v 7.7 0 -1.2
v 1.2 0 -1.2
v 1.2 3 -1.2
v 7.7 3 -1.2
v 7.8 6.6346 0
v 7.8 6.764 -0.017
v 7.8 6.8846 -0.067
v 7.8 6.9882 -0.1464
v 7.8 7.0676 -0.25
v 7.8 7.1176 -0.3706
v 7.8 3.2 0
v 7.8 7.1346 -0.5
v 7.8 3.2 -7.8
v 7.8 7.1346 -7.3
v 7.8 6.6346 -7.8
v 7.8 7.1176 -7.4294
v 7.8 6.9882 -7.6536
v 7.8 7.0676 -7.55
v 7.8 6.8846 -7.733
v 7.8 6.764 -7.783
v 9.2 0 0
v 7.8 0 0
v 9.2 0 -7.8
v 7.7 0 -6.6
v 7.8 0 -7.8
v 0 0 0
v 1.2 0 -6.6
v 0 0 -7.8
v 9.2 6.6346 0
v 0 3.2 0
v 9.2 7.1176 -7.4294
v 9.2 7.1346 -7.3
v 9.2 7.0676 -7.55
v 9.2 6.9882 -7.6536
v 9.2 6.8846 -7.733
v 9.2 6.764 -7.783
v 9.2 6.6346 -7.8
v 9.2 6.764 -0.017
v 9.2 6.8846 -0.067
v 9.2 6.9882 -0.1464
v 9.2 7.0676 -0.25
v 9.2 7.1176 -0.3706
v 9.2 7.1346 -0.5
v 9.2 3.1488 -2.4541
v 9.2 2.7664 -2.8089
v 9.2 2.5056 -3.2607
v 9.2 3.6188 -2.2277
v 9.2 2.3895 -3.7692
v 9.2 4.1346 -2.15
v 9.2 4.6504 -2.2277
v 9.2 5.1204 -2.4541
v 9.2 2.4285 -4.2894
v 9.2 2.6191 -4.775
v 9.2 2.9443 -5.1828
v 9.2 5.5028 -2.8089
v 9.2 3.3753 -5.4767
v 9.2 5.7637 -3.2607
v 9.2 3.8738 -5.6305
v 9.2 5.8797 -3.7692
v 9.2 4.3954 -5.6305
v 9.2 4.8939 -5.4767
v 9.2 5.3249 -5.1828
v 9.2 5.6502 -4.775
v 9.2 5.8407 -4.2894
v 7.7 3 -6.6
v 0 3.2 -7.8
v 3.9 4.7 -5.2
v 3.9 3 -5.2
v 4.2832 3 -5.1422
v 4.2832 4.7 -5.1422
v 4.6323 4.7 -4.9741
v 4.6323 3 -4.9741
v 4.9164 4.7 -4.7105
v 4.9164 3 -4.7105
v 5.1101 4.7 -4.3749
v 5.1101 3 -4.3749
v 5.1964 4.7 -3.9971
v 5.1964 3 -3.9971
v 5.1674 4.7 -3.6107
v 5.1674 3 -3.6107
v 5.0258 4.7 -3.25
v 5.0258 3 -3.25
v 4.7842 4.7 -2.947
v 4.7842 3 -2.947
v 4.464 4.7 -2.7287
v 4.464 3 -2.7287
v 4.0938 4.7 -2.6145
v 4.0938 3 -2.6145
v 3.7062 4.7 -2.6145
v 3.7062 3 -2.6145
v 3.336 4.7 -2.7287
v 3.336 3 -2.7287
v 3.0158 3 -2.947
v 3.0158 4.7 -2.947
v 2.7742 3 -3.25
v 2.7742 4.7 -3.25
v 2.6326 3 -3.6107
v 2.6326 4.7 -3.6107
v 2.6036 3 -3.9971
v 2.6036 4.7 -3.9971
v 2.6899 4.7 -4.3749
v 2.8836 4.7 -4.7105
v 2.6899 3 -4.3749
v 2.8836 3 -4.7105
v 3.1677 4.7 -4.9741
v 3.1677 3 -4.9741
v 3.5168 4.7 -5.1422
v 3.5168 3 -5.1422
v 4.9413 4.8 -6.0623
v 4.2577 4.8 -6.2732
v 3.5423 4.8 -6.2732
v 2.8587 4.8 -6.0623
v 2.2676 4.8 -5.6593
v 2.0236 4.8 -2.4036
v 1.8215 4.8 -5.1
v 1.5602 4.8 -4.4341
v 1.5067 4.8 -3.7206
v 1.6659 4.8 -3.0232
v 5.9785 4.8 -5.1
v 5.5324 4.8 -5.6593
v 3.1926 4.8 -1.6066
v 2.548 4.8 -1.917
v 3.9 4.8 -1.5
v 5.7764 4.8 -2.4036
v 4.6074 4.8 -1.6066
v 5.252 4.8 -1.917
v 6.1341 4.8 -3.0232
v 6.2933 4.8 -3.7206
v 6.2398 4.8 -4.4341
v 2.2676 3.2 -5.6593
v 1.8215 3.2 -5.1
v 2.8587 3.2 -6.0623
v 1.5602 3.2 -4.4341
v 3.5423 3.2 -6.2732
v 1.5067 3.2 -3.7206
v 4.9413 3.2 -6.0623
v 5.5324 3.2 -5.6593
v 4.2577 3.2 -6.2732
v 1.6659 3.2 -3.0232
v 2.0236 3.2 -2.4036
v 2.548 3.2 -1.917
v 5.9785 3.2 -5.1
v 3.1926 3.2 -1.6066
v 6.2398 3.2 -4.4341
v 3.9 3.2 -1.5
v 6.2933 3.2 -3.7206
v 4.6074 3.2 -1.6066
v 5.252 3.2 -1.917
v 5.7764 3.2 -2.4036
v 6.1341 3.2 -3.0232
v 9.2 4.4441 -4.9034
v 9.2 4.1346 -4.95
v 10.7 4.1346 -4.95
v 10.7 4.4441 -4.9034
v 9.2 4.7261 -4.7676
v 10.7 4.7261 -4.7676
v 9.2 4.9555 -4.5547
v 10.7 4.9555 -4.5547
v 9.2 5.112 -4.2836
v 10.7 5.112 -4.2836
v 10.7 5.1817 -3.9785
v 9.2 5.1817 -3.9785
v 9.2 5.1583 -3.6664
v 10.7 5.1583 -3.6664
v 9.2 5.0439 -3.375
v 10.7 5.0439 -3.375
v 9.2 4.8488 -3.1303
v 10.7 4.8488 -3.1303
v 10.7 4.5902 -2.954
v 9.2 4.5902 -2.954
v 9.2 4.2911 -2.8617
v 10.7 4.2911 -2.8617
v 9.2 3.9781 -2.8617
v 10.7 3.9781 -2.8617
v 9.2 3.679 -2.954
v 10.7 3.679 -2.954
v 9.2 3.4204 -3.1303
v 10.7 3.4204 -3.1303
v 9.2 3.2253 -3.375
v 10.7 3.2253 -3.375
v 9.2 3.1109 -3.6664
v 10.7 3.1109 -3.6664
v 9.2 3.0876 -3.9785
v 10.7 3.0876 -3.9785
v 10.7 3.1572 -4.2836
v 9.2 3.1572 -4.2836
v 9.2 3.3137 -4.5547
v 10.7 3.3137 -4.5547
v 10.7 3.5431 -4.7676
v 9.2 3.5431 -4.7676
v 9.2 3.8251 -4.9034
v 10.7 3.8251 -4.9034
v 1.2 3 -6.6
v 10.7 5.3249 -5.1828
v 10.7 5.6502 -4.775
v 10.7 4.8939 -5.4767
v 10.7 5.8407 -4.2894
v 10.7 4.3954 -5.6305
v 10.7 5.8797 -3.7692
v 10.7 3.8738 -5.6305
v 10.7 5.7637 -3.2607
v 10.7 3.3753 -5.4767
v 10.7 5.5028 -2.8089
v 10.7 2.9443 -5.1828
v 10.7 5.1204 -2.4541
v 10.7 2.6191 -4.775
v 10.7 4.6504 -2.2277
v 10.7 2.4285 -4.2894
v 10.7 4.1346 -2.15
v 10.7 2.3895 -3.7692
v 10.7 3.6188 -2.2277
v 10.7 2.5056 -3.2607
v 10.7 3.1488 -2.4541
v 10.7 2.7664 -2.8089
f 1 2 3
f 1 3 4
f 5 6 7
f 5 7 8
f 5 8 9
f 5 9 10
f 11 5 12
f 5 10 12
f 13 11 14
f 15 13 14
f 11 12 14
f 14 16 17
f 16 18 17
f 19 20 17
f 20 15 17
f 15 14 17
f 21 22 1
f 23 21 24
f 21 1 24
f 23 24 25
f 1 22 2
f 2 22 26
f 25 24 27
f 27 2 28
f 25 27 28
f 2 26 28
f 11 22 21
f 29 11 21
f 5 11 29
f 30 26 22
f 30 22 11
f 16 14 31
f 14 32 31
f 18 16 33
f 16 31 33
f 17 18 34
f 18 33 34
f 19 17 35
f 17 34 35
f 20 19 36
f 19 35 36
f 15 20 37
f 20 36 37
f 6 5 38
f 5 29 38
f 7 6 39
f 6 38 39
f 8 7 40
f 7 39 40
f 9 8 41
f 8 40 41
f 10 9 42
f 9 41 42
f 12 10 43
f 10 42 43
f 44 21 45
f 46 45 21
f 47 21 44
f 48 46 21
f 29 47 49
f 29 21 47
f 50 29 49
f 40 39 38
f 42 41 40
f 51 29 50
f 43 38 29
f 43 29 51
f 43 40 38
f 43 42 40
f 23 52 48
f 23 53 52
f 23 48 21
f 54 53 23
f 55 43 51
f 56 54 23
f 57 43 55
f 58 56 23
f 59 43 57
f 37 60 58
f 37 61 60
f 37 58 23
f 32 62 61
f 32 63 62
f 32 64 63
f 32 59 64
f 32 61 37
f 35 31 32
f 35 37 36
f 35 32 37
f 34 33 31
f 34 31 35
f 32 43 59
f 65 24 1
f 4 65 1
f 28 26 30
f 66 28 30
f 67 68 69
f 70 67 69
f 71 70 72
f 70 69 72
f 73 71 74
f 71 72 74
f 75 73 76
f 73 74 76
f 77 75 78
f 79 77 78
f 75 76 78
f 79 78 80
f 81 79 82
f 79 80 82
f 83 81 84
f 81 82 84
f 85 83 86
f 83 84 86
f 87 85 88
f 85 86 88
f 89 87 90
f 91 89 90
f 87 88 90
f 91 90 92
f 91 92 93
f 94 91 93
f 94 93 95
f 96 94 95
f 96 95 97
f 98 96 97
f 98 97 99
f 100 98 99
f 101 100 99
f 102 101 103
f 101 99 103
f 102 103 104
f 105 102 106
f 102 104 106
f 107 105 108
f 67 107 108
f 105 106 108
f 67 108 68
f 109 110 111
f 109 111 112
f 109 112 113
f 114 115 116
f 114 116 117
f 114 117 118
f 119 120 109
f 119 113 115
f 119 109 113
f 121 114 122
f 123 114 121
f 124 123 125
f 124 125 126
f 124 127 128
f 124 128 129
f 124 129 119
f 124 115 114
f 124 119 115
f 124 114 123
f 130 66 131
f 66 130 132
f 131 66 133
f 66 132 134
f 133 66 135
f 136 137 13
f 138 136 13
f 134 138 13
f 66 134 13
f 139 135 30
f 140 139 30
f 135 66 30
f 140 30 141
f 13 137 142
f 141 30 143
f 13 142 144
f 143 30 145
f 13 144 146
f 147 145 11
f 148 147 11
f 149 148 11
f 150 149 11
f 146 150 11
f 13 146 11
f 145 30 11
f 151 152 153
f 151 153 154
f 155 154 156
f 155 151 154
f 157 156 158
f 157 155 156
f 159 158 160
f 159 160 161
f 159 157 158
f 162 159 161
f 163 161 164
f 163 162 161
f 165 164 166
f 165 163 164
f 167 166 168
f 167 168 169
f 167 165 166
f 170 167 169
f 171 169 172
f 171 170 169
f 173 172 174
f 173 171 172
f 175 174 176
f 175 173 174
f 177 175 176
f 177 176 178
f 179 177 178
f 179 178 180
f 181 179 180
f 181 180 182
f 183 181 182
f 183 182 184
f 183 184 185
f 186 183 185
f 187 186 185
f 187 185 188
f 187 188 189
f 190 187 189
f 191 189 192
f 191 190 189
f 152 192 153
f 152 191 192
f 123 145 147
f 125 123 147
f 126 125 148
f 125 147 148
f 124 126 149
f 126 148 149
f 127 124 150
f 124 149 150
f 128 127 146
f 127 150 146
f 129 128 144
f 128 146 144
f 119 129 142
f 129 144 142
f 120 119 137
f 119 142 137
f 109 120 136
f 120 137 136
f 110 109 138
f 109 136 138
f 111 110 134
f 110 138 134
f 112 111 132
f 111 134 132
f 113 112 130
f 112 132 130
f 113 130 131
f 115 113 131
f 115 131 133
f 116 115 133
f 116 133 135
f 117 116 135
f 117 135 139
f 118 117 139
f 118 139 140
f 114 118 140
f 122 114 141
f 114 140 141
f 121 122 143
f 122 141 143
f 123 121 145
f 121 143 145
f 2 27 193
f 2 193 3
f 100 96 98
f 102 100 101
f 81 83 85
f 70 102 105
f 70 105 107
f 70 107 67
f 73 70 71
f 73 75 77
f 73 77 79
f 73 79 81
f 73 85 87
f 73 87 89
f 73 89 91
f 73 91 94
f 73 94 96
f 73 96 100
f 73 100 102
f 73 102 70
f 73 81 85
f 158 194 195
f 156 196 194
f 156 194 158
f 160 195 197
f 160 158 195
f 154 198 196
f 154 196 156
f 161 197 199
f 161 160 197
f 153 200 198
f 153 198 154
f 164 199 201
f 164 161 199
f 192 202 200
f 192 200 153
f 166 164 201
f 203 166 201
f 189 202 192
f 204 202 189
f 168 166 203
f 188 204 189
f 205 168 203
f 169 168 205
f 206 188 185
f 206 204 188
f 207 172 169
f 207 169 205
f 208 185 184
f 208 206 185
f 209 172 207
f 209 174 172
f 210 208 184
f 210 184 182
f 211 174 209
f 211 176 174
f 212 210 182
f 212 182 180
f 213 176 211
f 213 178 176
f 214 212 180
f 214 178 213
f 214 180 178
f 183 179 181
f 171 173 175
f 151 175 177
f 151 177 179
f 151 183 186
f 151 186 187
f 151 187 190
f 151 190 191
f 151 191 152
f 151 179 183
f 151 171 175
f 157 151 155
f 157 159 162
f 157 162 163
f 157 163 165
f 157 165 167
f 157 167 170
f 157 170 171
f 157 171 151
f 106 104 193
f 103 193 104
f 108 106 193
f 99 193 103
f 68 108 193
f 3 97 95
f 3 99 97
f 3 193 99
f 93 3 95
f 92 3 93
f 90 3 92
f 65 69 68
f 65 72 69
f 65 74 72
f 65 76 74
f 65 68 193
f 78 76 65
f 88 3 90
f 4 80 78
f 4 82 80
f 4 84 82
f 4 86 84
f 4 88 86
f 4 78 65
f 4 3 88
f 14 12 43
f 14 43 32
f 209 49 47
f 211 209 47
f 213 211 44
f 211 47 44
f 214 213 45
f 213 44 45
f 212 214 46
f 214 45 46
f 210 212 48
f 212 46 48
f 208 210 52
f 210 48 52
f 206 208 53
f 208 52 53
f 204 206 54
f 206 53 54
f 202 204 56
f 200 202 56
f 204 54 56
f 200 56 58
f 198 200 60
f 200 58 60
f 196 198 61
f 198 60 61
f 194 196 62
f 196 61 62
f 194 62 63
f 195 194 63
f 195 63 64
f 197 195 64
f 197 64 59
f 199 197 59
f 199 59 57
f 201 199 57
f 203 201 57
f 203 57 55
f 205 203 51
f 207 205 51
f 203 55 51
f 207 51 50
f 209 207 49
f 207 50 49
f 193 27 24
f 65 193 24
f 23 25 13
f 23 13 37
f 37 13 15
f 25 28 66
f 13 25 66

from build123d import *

# Parameters (mm, degrees)
SKETCH1_W           = 7.8
SKETCH1_H           = 3.2
BOSS_EXTRUDE1_DEPTH = 7.8
SKETCH2_R           = 2.4
BOSS_EXTRUDE2_DEPTH = 1.6
SKETCH3_W           = 6.5
SKETCH3_H           = 5.4
CUT_EXTRUDE1_DEPTH  = 3
SKETCH4_R           = 1.3
CUT_EXTRUDE2_DEPTH  = 1.7
SKETCH5_W           = 7.8
SKETCH5_H           = 7.134621369
BOSS_EXTRUDE3_DEPTH = 1.4
FILLET1_R           = 0.5
SKETCH6_R           = 1.75
SKETCH6_R_2         = 1.05
BOSS_EXTRUDE4_DEPTH = 1.5


with BuildPart() as part:
    # Sketch1 → Boss-Extrude1 (new body)
    with BuildSketch(Plane.XY):
        with Locations((3.9, 1.6)):
            Rectangle(SKETCH1_W, SKETCH1_H)
    extrude(amount=-BOSS_EXTRUDE1_DEPTH)

    # Sketch2 → Boss-Extrude2 (add)
    with BuildSketch(Plane(origin=(0, 3.2, 0), x_dir=(1, 0, 0), z_dir=(0, 1, 0))):
        with Locations(Location((3.9, 3.9, 0), (0, 0, 270))):
            Circle(SKETCH2_R)
    extrude(amount=BOSS_EXTRUDE2_DEPTH)

    # Sketch3 → Cut-Extrude1 (cut)
    with BuildSketch(Plane.XZ):
        with Locations((4.45, -3.9)):
            Rectangle(SKETCH3_W, SKETCH3_H)
    extrude(amount=-CUT_EXTRUDE1_DEPTH, mode=Mode.SUBTRACT)

    # Sketch4 → Cut-Extrude2 (cut)
    with BuildSketch(Plane.XZ.offset(-3)):
        with Locations(Location((3.9, -3.9, 0), (0, 0, 270))):
            Circle(SKETCH4_R)
    extrude(amount=-CUT_EXTRUDE2_DEPTH, mode=Mode.SUBTRACT)

    # Sketch5 → Boss-Extrude3 (add)
    with BuildSketch(Plane(origin=(7.8, 0, 0), x_dir=(0, 0, -1), z_dir=(1, 0, 0))):
        with Locations((3.9, 3.567310685)):
            Rectangle(SKETCH5_W, SKETCH5_H)
    extrude(amount=BOSS_EXTRUDE3_DEPTH)

    # Fillet1
    fillet1_edges = [part.edges().sort_by_distance(p)[0] for p in [
        (8.5, 7.134621369, -7.8),
        (8.5, 7.134621369, 0),
    ]]
    fillet(fillet1_edges, radius=FILLET1_R)

    # Sketch6 → Boss-Extrude4 (add)
    with BuildSketch(Plane(origin=(9.2, 0, 0), x_dir=(0, 0, -1), z_dir=(1, 0, 0))):
        with Locations(Location((3.9, 4.134621369, 0), (0, 0, 180))):
            Circle(SKETCH6_R)
        with Locations((3.9, 4.134621369)):
            Circle(SKETCH6_R_2, mode=Mode.SUBTRACT)
    extrude(amount=BOSS_EXTRUDE4_DEPTH)


solid = part.part
